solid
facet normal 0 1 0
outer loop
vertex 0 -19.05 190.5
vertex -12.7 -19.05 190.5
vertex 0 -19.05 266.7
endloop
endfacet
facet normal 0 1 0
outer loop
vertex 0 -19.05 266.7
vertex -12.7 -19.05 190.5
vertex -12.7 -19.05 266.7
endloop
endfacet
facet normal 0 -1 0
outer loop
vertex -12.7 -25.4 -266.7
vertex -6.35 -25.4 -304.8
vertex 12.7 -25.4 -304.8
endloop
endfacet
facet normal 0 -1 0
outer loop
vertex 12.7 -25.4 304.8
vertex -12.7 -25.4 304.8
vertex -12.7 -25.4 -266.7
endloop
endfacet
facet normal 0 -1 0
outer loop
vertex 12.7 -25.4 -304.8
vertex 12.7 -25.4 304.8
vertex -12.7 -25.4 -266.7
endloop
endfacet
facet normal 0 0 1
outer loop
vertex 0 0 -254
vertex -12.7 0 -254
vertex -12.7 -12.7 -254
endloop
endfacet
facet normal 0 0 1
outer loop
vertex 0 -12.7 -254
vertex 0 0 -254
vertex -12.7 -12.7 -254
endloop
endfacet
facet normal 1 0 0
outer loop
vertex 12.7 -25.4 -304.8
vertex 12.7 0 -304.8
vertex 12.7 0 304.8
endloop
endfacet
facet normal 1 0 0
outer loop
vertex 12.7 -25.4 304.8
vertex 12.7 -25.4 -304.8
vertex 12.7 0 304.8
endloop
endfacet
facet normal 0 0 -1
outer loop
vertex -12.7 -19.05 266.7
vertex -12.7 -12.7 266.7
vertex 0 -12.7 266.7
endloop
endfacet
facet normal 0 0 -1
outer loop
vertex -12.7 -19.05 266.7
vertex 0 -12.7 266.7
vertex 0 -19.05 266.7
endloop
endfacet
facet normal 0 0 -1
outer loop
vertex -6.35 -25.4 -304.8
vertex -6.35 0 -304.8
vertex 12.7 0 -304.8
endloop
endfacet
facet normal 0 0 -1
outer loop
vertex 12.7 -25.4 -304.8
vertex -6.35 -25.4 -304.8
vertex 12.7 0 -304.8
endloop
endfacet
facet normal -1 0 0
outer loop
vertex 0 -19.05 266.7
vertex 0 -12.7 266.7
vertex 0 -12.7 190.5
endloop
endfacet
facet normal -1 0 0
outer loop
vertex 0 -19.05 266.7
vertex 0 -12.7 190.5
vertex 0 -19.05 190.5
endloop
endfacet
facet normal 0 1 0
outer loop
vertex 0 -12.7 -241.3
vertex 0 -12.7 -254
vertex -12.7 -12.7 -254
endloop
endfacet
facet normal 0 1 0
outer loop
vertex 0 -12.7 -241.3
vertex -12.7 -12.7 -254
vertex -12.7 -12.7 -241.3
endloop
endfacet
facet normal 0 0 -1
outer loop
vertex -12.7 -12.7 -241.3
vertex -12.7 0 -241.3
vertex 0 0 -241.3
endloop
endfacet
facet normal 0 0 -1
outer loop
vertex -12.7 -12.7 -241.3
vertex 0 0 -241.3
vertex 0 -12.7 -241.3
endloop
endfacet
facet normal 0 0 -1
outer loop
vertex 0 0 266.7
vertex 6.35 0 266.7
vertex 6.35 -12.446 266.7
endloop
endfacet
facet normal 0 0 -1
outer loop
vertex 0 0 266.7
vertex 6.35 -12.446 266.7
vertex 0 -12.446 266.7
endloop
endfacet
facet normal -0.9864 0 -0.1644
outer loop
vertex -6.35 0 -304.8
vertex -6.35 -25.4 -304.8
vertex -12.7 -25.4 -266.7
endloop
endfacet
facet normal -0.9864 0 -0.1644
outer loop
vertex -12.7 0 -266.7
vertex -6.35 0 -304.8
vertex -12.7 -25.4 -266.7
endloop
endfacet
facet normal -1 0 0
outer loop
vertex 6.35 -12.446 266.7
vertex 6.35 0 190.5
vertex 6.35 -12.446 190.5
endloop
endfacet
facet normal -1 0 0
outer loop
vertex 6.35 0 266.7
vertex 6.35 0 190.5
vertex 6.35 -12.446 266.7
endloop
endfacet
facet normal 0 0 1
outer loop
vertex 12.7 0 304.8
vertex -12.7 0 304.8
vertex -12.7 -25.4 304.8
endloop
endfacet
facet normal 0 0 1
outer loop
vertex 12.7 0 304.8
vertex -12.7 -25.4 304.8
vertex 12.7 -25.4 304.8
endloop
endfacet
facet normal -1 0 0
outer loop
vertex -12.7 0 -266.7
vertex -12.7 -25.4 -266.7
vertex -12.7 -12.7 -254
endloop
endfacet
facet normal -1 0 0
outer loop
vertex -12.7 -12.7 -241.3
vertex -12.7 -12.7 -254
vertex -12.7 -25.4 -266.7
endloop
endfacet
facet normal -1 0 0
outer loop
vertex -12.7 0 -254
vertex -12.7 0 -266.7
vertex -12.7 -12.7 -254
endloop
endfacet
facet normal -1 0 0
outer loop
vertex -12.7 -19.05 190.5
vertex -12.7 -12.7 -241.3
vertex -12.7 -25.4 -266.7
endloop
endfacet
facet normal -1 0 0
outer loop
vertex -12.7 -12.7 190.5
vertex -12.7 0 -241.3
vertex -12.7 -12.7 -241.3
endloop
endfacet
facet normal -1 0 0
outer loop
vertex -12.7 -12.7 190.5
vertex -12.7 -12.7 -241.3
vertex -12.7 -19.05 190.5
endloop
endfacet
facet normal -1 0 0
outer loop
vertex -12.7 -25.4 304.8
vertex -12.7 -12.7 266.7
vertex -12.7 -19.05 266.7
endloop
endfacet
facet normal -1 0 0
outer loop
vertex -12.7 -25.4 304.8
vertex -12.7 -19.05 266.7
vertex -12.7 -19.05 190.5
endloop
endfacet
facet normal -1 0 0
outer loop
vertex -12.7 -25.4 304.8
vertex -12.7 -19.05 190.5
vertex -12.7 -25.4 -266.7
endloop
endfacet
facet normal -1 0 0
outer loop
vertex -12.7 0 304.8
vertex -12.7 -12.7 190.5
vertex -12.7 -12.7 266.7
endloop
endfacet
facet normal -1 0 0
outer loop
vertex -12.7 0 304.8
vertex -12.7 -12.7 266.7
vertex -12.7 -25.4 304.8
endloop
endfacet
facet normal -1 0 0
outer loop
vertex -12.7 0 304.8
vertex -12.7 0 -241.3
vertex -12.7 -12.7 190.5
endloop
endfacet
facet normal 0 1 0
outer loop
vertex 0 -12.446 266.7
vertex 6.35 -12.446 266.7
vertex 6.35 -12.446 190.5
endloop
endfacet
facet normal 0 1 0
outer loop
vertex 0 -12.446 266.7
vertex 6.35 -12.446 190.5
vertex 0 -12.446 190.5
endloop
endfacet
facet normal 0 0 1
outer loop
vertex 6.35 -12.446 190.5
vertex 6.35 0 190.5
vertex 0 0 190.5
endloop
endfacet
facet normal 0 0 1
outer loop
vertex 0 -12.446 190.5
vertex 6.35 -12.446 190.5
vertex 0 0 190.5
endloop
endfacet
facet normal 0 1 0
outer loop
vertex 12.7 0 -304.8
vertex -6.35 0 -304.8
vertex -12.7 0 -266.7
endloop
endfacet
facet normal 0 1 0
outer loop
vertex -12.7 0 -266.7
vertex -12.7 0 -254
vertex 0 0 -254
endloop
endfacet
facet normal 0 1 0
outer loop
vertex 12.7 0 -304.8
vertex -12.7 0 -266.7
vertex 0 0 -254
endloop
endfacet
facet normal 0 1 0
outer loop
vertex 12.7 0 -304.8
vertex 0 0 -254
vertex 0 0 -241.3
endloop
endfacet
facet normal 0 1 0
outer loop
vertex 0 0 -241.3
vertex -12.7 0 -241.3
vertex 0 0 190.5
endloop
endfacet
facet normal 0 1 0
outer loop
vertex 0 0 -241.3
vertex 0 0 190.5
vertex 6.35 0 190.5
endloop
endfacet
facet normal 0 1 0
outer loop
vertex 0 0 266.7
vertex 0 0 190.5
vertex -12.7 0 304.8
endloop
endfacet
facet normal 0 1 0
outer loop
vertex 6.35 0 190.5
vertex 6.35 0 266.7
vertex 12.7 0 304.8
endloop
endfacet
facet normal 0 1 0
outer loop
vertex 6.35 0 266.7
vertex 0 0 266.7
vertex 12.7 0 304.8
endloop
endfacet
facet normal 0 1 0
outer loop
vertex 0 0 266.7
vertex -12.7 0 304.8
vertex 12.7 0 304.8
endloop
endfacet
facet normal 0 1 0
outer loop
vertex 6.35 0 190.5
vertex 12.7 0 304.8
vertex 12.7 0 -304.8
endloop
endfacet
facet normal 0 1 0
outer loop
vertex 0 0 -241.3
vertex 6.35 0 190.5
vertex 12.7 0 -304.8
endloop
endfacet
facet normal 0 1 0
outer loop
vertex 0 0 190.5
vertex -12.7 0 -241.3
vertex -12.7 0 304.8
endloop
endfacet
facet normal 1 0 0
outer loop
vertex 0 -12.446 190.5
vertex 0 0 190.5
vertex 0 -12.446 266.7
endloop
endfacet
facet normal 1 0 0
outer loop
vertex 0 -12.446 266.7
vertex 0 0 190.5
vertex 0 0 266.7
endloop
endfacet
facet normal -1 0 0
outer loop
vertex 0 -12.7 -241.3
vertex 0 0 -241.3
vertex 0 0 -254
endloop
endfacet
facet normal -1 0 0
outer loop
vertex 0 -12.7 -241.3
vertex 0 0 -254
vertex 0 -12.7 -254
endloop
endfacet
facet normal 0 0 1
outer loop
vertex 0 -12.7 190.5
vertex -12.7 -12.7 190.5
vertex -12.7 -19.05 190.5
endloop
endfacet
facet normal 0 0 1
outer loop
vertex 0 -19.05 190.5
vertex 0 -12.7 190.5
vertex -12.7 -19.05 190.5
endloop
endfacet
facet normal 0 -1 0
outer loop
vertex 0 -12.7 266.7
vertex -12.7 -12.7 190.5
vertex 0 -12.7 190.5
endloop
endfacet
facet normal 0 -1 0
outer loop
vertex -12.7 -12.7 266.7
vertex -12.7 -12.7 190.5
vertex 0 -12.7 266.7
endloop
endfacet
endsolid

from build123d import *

# Parameters (mm, degrees)
F0_W     = 25.4
F0_H     = 609.6
F1_DEPTH = 25.4
F3_DEPTH = 25.4
F4_W     = 12.7
F4_H     = 12.7
F5_DEPTH = 12.7
F6_W     = 6.35
F6_H     = 76.2
F7_DEPTH = 12.7
F8_W     = 6.35
F8_H     = 76.2
F9_DEPTH = 12.446


with BuildPart() as f1:
    # F0 (on Front) → F1 (new body)
    with BuildSketch(Plane.XZ):
        Rectangle(F0_W, F0_H)
    extrude(amount=F1_DEPTH)

    # F2 (on face) → F3 (cut)
    with BuildSketch(Plane.XZ.offset(25.4)):
        Polygon((-12.7, -304.8), (-6.35, -304.8), (-12.7, -266.7), align=None)
    extrude(amount=-F3_DEPTH, mode=Mode.SUBTRACT)

    # F4 (on face) → F5 (cut)
    with BuildSketch(Plane(origin=(-12.7, 0, 0), x_dir=(0, -1, 0), z_dir=(-1, 0, 0))):
        with Locations((6.35, -247.65)):
            Rectangle(F4_W, F4_H)
    extrude(amount=-F5_DEPTH, mode=Mode.SUBTRACT)

    # F6 (on face) → F7 (cut)
    with BuildSketch(Plane(origin=(-12.7, 0, 0), x_dir=(0, -1, 0), z_dir=(-1, 0, 0))):
        with Locations((15.875, 228.6)):
            Rectangle(F6_W, F6_H)
    extrude(amount=-F7_DEPTH, mode=Mode.SUBTRACT)

    # F8 (on face) → F9 (cut)
    with BuildSketch(Plane(origin=(0, 0, 0), x_dir=(-1, 0, 0), z_dir=(0, 1, 0))):
        with Locations((-3.175, 228.6)):
            Rectangle(F8_W, F8_H)
    extrude(amount=-F9_DEPTH, mode=Mode.SUBTRACT)


solid = f1.part
